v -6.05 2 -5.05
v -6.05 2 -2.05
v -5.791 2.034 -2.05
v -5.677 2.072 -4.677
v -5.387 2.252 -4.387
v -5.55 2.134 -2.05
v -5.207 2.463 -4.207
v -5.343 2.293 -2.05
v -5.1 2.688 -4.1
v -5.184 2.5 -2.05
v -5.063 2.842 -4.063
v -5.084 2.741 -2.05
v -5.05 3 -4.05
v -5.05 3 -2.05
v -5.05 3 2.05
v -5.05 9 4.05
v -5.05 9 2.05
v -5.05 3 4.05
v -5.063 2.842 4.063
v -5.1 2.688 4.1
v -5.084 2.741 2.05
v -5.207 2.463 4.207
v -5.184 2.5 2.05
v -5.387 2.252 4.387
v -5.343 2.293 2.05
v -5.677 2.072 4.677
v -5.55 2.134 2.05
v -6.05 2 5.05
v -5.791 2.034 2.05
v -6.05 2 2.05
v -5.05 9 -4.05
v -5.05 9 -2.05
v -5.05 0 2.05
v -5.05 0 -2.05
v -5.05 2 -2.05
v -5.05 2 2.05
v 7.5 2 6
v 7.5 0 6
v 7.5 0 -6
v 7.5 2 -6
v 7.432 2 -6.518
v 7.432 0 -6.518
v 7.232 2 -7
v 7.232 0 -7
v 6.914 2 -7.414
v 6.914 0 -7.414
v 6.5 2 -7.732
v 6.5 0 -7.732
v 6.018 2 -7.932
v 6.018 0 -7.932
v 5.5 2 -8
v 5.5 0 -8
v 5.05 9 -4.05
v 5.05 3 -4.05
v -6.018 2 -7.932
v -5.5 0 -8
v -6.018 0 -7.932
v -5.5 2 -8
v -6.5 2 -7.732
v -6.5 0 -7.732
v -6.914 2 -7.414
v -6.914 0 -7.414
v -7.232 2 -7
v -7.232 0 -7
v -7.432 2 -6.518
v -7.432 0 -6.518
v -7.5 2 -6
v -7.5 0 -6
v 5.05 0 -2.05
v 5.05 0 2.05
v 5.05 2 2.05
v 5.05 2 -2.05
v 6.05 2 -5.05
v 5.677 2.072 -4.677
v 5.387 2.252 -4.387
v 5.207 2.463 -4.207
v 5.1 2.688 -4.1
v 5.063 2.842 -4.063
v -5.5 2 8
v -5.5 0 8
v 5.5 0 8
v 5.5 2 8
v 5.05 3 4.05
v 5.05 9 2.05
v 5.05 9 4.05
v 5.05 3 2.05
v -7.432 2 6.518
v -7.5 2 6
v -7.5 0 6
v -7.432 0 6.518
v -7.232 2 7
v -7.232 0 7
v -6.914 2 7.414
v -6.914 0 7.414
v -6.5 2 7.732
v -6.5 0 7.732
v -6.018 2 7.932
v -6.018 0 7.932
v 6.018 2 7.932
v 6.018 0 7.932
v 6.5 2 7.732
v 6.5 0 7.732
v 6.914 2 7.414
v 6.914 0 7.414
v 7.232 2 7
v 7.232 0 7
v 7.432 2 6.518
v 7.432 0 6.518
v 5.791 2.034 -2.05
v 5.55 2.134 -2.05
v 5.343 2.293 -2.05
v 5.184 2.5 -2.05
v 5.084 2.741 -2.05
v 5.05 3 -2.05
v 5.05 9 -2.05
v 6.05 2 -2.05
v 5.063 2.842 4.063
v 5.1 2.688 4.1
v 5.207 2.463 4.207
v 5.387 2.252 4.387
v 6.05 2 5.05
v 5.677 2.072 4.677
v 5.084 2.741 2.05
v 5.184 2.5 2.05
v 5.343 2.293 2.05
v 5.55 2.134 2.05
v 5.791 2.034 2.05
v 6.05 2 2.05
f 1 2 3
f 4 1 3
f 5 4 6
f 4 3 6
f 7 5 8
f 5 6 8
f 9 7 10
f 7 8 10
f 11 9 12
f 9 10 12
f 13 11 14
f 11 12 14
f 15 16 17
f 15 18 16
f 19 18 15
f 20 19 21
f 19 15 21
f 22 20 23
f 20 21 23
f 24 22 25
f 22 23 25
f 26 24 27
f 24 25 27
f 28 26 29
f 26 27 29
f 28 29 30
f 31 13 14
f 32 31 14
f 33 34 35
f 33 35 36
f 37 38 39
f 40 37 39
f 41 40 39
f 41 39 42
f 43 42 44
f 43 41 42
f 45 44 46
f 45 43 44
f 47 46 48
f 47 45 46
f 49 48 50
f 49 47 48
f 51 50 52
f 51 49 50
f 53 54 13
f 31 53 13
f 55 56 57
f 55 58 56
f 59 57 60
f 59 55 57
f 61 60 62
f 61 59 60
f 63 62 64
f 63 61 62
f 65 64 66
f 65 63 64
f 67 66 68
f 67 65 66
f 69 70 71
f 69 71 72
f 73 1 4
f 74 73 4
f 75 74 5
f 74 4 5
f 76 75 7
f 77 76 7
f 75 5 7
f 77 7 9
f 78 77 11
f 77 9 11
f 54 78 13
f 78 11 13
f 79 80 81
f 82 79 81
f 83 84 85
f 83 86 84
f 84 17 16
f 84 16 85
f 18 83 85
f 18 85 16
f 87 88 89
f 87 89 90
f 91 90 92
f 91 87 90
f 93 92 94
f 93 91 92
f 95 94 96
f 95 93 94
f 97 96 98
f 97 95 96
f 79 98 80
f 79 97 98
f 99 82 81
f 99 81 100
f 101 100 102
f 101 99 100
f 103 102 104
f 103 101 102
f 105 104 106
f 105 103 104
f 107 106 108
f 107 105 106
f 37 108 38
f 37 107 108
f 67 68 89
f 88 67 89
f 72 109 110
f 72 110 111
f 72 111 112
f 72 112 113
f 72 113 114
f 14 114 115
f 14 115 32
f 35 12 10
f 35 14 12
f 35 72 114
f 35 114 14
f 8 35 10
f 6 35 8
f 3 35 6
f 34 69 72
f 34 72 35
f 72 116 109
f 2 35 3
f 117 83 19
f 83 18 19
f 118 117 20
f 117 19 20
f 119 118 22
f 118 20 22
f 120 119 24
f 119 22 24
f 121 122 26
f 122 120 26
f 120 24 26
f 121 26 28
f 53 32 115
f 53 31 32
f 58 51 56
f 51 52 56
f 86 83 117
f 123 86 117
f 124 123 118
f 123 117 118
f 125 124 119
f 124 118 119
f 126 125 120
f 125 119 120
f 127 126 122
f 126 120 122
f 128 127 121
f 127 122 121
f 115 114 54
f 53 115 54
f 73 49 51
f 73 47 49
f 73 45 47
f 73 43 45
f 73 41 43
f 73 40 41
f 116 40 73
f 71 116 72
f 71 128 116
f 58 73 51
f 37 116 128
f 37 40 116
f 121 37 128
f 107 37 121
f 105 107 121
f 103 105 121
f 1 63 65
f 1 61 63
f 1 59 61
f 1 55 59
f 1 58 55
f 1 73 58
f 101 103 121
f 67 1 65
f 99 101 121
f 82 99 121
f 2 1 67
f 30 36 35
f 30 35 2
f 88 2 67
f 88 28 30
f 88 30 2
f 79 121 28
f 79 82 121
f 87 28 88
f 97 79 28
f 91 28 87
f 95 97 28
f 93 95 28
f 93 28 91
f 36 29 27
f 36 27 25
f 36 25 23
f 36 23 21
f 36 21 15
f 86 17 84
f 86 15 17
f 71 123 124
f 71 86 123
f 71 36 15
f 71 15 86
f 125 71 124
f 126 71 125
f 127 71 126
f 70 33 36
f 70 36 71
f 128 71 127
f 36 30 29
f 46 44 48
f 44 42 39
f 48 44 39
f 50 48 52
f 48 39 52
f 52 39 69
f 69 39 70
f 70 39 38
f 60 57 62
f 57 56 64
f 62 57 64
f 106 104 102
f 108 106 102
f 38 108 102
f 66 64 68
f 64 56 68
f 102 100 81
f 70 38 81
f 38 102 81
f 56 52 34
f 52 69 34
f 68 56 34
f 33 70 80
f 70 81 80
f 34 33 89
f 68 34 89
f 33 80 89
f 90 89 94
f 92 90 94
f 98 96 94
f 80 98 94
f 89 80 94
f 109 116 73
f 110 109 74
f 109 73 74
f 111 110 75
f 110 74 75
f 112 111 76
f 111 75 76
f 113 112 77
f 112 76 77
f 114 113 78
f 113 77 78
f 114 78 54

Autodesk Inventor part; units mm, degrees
ref_plane "YZ Plane" through (0, 0, 0) normal (1, 0, 0) x (0, 1, 0)
ref_plane "XZ Plane" through (0, 0, 0) normal (0, 1, 0) x (-1, 0, 0)
ref_plane "XY Plane" through (0, 0, 0) normal (0, 0, 1) x (1, 0, 0)
sketch "スケッチ1" plane through (0, 0, 0) normal (0, 1, 0) x (-1, 0, 0)
  line L0 (7.5, 8) -> (-7.5, 8)
  line L1 (-7.5, 8) -> (-7.5, -8)
  line L2 (-7.5, -8) -> (7.5, -8)
  line L3 (7.5, -8) -> (7.5, 8)
  line L4 (7.5, 8) -> (-7.5, -8) construction
  line L5 (-7.5, 8) -> (7.5, -8) construction
  line L6 (5.05, 2.05) -> (-5.05, 2.05)
  line L7 (-5.05, 2.05) -> (-5.05, -2.05)
  line L8 (-5.05, -2.05) -> (5.05, -2.05)
  line L9 (5.05, -2.05) -> (5.05, 2.05)
  line L10 (5.05, 2.05) -> (-5.05, -2.05) construction
  line L11 (-5.05, 2.05) -> (5.05, -2.05) construction
  point P0 (0, 0)
  dimension "d0" = 15
  dimension "d1" = 16
  dimension "d2" = 10.1
  dimension "d3" = 4.1
extrude "押し出し1" add sketch "スケッチ1" along normal blind 2
sketch "スケッチ2" plane through (0, 2, 0) normal (0, 1, 0) x (1, 0, 0)
  line L0 (-5.05, 2.05) -> (5.05, 2.05) projected
  line L1 (-5.05, 2.05) -> (5.05, 2.05)
  line L2 (5.05, 2.05) -> (5.05, 4.05)
  line L3 (5.05, 4.05) -> (-5.05, 4.05)
  line L4 (-5.05, 4.05) -> (-5.05, 2.05)
  line L5 (5.05, -2.05) -> (-5.05, -2.05) projected
  line L6 (-5.05, -2.05) -> (5.05, -2.05)
  line L7 (5.05, -2.05) -> (5.05, -4.05)
  line L8 (5.05, -4.05) -> (-5.05, -4.05)
  line L9 (-5.05, -4.05) -> (-5.05, -2.05)
  point P0 (0, 0)
  point P1 (5.05, 2.05)
  dimension "d6" = 2
  dimension "d7" = 2
extrude "押し出し2" add sketch "スケッチ2" along normal blind 7
fillet "フィレット1" radius 1 6 edges at (5.05, 2, 3.05) (0, 2, 4.05) (-5.05, 2, 3.05) (-5.05, 2, -3.05) (0, 2, -4.05) (5.05, 2, -3.05)
fillet "フィレット2" radius 2 4 edges at (7.5, 1, -8) (-7.5, 1, -8) (-7.5, 1, 8) (7.5, 1, 8)
equation "\"d7\" = d6"
properties part number "LRA_case1"
